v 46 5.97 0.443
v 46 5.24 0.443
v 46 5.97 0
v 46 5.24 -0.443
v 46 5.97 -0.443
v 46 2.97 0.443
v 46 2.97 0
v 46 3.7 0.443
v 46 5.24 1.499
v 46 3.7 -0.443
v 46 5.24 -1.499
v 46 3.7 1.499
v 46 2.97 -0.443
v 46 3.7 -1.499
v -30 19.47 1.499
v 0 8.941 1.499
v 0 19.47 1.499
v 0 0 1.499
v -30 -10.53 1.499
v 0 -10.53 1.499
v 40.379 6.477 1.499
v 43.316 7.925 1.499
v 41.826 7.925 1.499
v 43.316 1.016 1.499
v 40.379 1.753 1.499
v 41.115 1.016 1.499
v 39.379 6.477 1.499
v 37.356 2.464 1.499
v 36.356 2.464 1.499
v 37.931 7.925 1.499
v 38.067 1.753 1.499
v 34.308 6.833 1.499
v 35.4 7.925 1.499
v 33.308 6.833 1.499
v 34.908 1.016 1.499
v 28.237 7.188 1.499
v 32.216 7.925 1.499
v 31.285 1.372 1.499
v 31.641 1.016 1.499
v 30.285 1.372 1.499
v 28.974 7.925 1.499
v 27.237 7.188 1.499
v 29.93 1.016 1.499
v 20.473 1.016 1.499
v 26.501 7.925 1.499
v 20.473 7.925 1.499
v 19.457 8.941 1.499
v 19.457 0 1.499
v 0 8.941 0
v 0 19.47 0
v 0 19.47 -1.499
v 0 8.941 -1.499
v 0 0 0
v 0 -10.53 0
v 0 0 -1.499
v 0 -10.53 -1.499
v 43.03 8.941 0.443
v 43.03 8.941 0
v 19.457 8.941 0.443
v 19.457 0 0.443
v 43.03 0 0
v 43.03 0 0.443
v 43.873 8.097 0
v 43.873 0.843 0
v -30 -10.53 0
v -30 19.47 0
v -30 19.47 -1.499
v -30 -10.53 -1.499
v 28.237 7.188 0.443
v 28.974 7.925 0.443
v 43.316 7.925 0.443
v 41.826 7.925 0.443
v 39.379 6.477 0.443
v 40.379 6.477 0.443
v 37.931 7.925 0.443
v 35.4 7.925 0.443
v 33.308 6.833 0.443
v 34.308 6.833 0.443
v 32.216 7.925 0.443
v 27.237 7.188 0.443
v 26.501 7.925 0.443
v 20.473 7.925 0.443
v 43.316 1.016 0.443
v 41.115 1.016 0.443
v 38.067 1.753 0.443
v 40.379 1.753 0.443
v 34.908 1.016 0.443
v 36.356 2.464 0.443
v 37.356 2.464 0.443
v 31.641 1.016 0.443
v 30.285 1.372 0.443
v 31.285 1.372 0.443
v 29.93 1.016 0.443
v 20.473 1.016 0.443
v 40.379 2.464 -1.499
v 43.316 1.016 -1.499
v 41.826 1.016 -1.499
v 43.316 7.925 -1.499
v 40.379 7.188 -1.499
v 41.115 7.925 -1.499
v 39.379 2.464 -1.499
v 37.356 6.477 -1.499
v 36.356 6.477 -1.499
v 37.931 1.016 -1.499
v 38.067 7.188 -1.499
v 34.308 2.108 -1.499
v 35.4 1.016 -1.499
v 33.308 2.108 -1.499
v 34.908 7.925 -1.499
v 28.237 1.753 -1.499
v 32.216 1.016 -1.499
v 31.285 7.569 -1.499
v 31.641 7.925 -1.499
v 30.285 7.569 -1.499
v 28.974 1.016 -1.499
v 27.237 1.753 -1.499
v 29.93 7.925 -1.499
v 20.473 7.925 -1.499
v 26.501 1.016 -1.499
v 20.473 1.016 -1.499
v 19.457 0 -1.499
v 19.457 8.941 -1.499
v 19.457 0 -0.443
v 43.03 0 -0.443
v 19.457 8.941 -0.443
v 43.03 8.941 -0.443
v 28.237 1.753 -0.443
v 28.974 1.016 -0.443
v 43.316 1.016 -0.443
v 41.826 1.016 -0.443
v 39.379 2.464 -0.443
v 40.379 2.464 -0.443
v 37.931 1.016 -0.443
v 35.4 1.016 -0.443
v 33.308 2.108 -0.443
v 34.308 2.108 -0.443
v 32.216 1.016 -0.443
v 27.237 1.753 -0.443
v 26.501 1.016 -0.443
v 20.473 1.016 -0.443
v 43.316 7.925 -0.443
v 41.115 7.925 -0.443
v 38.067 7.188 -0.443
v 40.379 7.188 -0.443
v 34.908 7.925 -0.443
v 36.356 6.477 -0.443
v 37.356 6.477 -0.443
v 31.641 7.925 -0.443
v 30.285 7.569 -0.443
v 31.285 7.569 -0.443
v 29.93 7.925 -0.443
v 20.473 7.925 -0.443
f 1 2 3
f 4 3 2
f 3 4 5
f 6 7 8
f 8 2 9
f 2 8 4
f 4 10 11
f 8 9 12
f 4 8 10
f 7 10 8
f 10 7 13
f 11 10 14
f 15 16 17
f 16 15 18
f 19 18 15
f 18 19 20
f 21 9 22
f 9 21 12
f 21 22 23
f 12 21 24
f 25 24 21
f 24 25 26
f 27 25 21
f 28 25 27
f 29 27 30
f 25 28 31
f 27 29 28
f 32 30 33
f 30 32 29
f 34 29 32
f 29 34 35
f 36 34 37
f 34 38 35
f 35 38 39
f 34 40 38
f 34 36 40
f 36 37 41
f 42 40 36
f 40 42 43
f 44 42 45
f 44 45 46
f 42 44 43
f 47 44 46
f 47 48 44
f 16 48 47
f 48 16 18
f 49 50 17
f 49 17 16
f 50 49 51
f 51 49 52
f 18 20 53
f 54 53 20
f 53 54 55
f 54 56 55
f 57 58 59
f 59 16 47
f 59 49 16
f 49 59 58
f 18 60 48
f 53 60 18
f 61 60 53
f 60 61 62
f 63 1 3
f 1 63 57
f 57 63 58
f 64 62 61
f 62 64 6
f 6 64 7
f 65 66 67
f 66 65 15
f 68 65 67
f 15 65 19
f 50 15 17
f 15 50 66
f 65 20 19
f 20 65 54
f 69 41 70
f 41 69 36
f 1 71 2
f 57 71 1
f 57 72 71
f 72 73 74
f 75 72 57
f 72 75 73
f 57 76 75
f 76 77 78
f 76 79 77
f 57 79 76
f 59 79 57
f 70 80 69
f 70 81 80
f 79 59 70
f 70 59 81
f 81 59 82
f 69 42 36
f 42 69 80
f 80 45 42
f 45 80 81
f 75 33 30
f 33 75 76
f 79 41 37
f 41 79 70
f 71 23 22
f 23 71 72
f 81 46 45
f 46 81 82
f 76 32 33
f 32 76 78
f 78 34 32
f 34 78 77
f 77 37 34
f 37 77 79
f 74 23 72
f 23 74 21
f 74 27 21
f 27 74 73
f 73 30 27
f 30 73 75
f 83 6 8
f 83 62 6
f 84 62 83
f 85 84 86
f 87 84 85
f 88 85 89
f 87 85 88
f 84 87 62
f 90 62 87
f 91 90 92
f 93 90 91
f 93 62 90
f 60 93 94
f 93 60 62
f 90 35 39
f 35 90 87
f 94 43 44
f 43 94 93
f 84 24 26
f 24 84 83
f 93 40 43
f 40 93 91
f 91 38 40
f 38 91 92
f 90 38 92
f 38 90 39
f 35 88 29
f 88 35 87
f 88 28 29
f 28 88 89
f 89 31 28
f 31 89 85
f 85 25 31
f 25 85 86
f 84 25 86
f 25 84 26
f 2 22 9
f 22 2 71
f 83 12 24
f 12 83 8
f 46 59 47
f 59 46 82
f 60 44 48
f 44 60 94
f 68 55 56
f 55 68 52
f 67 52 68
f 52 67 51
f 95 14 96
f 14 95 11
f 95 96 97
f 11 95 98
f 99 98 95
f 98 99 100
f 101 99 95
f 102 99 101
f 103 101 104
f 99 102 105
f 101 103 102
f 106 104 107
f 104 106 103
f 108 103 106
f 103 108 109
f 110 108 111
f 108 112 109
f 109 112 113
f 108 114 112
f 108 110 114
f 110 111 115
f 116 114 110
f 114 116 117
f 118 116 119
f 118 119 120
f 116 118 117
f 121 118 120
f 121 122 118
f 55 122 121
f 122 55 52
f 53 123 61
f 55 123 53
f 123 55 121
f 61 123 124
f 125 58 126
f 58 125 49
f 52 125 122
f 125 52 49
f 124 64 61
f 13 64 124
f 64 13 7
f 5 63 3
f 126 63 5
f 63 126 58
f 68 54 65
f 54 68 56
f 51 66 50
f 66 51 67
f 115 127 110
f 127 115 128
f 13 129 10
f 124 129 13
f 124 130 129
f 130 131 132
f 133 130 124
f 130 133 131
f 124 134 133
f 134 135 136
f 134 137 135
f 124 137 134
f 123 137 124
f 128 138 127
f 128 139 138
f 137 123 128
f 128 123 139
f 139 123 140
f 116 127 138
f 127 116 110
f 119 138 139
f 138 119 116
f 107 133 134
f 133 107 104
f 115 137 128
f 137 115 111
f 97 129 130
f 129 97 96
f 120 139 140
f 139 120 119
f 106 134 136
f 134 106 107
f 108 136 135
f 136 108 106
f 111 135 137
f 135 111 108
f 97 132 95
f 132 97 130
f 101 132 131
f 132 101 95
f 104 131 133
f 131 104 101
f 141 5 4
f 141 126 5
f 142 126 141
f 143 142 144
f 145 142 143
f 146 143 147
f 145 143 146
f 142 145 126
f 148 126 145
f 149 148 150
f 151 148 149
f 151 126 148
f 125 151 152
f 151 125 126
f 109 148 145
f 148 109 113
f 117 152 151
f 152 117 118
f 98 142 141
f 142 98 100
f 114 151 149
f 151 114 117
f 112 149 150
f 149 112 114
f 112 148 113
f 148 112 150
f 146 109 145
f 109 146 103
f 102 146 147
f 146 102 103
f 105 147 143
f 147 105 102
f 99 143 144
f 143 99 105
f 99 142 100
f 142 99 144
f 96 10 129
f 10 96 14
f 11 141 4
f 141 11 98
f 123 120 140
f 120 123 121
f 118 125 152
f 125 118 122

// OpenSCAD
function mm(i) = i*25.4;
function in(mm) = mm/25.4;

blade_h = mm(.118)/2;
blade_w = mm(.352);
blade_l = 46;
blade_tip_w = 3;
body_l = 30;
cut_h = (blade_tip_w-mm(.035))/2;
cut_w = 1;

depths = [in(blade_w), .312, .298, .283, .269, .255, .241, in(blade_w/2)];
incr = .12;
positions = [.719, .599, .480, .360, .241, .241 - incr, -.05];
guard = 1.005;

module blank() {
    translate([-body_l, -body_l/2+blade_w/2, 0]) {
        cube([body_l, body_l, blade_h]);
    }
    difference() {
    cube([blade_l, blade_w, blade_h]);
        translate([blade_l, blade_w/2+blade_tip_w/2, 0]) {
            rotate([0,0,45]) {
                cube([10, 10, blade_h]);
            }
        }
        translate([blade_l, blade_w/2-blade_tip_w/2, 0]) {
            rotate([0,0,45+180]) {
                cube([10, 10, blade_h]);
            }
        }
    }
}


module cut_shape(w, d) {
    linear_extrude(height=cut_h) {
        hull(){
            translate([-w/2+(d<0?d:0), 0, 0]) {
                rotate([0,0,45]) {
                    square([10, 10]);
                }
            }
            translate([w/2+(d>0?d:0), 0, 0]) {
                rotate([0,0,45]) {
                    square([10, 10]);
                }
            }
        }
    }
}

module cut(position, bit, d) {
    if(position < 7) {
        translate([blade_l-mm(positions[position]), mm(depths[bit]), blade_h-cut_h]) {
            cut_shape(cut_w, d);
        }
    } else {
        translate([blade_l-mm(positions[position-7]), blade_w-mm(depths[bit]), blade_h-cut_h]) {
            rotate([0, 0, 180]) {
                cut_shape(cut_w, d);
            }
        }
    }
}

module half(bits) {
    difference() {
        blank();
        for(i=[0:4]){
            cut(i, bits[i], i<4 ? (bits[i+1] >= bits[i] ? mm(incr) : 0) : 0);
            cut(i, bits[i], i>0 ? (bits[i-1] >= bits[i] ? -mm(incr) : 0) : 0);
        }
        cut(5,1);
        cut(6,7);
        for(i=[7:11]){
            cut(i, bits[i-2], i<11 ? (bits[i-2+1] >= bits[i-2] ? -mm(incr) : 0) : 0);
            cut(i, bits[i-2], i>7 ? (bits[i-2-1] >= bits[i-2] ? mm(incr) : 0) : 0);
        }
        cut(12,1);
        cut(13,7);
        
        translate([blade_l, mm(depths[1]), blade_h-cut_h]) {
        cut_shape(mm(2*guard));
        }
        translate([blade_l, blade_w-mm(depths[1]), blade_h-cut_h]) {
            rotate([0, 0, 180]) {
                cut_shape(mm(2*guard));
            }
        }

    }
}

module full(bits) {
    union(){
        half(bits);
        translate([0, blade_w/2, 0]) {
            rotate([180, 0, 0]) {
                translate([0, -blade_w/2, 0]) {
                    half(bits);
                }
            }
        }
    }
}

full([3,1,4,1,5,1,2,1,5,3]);
